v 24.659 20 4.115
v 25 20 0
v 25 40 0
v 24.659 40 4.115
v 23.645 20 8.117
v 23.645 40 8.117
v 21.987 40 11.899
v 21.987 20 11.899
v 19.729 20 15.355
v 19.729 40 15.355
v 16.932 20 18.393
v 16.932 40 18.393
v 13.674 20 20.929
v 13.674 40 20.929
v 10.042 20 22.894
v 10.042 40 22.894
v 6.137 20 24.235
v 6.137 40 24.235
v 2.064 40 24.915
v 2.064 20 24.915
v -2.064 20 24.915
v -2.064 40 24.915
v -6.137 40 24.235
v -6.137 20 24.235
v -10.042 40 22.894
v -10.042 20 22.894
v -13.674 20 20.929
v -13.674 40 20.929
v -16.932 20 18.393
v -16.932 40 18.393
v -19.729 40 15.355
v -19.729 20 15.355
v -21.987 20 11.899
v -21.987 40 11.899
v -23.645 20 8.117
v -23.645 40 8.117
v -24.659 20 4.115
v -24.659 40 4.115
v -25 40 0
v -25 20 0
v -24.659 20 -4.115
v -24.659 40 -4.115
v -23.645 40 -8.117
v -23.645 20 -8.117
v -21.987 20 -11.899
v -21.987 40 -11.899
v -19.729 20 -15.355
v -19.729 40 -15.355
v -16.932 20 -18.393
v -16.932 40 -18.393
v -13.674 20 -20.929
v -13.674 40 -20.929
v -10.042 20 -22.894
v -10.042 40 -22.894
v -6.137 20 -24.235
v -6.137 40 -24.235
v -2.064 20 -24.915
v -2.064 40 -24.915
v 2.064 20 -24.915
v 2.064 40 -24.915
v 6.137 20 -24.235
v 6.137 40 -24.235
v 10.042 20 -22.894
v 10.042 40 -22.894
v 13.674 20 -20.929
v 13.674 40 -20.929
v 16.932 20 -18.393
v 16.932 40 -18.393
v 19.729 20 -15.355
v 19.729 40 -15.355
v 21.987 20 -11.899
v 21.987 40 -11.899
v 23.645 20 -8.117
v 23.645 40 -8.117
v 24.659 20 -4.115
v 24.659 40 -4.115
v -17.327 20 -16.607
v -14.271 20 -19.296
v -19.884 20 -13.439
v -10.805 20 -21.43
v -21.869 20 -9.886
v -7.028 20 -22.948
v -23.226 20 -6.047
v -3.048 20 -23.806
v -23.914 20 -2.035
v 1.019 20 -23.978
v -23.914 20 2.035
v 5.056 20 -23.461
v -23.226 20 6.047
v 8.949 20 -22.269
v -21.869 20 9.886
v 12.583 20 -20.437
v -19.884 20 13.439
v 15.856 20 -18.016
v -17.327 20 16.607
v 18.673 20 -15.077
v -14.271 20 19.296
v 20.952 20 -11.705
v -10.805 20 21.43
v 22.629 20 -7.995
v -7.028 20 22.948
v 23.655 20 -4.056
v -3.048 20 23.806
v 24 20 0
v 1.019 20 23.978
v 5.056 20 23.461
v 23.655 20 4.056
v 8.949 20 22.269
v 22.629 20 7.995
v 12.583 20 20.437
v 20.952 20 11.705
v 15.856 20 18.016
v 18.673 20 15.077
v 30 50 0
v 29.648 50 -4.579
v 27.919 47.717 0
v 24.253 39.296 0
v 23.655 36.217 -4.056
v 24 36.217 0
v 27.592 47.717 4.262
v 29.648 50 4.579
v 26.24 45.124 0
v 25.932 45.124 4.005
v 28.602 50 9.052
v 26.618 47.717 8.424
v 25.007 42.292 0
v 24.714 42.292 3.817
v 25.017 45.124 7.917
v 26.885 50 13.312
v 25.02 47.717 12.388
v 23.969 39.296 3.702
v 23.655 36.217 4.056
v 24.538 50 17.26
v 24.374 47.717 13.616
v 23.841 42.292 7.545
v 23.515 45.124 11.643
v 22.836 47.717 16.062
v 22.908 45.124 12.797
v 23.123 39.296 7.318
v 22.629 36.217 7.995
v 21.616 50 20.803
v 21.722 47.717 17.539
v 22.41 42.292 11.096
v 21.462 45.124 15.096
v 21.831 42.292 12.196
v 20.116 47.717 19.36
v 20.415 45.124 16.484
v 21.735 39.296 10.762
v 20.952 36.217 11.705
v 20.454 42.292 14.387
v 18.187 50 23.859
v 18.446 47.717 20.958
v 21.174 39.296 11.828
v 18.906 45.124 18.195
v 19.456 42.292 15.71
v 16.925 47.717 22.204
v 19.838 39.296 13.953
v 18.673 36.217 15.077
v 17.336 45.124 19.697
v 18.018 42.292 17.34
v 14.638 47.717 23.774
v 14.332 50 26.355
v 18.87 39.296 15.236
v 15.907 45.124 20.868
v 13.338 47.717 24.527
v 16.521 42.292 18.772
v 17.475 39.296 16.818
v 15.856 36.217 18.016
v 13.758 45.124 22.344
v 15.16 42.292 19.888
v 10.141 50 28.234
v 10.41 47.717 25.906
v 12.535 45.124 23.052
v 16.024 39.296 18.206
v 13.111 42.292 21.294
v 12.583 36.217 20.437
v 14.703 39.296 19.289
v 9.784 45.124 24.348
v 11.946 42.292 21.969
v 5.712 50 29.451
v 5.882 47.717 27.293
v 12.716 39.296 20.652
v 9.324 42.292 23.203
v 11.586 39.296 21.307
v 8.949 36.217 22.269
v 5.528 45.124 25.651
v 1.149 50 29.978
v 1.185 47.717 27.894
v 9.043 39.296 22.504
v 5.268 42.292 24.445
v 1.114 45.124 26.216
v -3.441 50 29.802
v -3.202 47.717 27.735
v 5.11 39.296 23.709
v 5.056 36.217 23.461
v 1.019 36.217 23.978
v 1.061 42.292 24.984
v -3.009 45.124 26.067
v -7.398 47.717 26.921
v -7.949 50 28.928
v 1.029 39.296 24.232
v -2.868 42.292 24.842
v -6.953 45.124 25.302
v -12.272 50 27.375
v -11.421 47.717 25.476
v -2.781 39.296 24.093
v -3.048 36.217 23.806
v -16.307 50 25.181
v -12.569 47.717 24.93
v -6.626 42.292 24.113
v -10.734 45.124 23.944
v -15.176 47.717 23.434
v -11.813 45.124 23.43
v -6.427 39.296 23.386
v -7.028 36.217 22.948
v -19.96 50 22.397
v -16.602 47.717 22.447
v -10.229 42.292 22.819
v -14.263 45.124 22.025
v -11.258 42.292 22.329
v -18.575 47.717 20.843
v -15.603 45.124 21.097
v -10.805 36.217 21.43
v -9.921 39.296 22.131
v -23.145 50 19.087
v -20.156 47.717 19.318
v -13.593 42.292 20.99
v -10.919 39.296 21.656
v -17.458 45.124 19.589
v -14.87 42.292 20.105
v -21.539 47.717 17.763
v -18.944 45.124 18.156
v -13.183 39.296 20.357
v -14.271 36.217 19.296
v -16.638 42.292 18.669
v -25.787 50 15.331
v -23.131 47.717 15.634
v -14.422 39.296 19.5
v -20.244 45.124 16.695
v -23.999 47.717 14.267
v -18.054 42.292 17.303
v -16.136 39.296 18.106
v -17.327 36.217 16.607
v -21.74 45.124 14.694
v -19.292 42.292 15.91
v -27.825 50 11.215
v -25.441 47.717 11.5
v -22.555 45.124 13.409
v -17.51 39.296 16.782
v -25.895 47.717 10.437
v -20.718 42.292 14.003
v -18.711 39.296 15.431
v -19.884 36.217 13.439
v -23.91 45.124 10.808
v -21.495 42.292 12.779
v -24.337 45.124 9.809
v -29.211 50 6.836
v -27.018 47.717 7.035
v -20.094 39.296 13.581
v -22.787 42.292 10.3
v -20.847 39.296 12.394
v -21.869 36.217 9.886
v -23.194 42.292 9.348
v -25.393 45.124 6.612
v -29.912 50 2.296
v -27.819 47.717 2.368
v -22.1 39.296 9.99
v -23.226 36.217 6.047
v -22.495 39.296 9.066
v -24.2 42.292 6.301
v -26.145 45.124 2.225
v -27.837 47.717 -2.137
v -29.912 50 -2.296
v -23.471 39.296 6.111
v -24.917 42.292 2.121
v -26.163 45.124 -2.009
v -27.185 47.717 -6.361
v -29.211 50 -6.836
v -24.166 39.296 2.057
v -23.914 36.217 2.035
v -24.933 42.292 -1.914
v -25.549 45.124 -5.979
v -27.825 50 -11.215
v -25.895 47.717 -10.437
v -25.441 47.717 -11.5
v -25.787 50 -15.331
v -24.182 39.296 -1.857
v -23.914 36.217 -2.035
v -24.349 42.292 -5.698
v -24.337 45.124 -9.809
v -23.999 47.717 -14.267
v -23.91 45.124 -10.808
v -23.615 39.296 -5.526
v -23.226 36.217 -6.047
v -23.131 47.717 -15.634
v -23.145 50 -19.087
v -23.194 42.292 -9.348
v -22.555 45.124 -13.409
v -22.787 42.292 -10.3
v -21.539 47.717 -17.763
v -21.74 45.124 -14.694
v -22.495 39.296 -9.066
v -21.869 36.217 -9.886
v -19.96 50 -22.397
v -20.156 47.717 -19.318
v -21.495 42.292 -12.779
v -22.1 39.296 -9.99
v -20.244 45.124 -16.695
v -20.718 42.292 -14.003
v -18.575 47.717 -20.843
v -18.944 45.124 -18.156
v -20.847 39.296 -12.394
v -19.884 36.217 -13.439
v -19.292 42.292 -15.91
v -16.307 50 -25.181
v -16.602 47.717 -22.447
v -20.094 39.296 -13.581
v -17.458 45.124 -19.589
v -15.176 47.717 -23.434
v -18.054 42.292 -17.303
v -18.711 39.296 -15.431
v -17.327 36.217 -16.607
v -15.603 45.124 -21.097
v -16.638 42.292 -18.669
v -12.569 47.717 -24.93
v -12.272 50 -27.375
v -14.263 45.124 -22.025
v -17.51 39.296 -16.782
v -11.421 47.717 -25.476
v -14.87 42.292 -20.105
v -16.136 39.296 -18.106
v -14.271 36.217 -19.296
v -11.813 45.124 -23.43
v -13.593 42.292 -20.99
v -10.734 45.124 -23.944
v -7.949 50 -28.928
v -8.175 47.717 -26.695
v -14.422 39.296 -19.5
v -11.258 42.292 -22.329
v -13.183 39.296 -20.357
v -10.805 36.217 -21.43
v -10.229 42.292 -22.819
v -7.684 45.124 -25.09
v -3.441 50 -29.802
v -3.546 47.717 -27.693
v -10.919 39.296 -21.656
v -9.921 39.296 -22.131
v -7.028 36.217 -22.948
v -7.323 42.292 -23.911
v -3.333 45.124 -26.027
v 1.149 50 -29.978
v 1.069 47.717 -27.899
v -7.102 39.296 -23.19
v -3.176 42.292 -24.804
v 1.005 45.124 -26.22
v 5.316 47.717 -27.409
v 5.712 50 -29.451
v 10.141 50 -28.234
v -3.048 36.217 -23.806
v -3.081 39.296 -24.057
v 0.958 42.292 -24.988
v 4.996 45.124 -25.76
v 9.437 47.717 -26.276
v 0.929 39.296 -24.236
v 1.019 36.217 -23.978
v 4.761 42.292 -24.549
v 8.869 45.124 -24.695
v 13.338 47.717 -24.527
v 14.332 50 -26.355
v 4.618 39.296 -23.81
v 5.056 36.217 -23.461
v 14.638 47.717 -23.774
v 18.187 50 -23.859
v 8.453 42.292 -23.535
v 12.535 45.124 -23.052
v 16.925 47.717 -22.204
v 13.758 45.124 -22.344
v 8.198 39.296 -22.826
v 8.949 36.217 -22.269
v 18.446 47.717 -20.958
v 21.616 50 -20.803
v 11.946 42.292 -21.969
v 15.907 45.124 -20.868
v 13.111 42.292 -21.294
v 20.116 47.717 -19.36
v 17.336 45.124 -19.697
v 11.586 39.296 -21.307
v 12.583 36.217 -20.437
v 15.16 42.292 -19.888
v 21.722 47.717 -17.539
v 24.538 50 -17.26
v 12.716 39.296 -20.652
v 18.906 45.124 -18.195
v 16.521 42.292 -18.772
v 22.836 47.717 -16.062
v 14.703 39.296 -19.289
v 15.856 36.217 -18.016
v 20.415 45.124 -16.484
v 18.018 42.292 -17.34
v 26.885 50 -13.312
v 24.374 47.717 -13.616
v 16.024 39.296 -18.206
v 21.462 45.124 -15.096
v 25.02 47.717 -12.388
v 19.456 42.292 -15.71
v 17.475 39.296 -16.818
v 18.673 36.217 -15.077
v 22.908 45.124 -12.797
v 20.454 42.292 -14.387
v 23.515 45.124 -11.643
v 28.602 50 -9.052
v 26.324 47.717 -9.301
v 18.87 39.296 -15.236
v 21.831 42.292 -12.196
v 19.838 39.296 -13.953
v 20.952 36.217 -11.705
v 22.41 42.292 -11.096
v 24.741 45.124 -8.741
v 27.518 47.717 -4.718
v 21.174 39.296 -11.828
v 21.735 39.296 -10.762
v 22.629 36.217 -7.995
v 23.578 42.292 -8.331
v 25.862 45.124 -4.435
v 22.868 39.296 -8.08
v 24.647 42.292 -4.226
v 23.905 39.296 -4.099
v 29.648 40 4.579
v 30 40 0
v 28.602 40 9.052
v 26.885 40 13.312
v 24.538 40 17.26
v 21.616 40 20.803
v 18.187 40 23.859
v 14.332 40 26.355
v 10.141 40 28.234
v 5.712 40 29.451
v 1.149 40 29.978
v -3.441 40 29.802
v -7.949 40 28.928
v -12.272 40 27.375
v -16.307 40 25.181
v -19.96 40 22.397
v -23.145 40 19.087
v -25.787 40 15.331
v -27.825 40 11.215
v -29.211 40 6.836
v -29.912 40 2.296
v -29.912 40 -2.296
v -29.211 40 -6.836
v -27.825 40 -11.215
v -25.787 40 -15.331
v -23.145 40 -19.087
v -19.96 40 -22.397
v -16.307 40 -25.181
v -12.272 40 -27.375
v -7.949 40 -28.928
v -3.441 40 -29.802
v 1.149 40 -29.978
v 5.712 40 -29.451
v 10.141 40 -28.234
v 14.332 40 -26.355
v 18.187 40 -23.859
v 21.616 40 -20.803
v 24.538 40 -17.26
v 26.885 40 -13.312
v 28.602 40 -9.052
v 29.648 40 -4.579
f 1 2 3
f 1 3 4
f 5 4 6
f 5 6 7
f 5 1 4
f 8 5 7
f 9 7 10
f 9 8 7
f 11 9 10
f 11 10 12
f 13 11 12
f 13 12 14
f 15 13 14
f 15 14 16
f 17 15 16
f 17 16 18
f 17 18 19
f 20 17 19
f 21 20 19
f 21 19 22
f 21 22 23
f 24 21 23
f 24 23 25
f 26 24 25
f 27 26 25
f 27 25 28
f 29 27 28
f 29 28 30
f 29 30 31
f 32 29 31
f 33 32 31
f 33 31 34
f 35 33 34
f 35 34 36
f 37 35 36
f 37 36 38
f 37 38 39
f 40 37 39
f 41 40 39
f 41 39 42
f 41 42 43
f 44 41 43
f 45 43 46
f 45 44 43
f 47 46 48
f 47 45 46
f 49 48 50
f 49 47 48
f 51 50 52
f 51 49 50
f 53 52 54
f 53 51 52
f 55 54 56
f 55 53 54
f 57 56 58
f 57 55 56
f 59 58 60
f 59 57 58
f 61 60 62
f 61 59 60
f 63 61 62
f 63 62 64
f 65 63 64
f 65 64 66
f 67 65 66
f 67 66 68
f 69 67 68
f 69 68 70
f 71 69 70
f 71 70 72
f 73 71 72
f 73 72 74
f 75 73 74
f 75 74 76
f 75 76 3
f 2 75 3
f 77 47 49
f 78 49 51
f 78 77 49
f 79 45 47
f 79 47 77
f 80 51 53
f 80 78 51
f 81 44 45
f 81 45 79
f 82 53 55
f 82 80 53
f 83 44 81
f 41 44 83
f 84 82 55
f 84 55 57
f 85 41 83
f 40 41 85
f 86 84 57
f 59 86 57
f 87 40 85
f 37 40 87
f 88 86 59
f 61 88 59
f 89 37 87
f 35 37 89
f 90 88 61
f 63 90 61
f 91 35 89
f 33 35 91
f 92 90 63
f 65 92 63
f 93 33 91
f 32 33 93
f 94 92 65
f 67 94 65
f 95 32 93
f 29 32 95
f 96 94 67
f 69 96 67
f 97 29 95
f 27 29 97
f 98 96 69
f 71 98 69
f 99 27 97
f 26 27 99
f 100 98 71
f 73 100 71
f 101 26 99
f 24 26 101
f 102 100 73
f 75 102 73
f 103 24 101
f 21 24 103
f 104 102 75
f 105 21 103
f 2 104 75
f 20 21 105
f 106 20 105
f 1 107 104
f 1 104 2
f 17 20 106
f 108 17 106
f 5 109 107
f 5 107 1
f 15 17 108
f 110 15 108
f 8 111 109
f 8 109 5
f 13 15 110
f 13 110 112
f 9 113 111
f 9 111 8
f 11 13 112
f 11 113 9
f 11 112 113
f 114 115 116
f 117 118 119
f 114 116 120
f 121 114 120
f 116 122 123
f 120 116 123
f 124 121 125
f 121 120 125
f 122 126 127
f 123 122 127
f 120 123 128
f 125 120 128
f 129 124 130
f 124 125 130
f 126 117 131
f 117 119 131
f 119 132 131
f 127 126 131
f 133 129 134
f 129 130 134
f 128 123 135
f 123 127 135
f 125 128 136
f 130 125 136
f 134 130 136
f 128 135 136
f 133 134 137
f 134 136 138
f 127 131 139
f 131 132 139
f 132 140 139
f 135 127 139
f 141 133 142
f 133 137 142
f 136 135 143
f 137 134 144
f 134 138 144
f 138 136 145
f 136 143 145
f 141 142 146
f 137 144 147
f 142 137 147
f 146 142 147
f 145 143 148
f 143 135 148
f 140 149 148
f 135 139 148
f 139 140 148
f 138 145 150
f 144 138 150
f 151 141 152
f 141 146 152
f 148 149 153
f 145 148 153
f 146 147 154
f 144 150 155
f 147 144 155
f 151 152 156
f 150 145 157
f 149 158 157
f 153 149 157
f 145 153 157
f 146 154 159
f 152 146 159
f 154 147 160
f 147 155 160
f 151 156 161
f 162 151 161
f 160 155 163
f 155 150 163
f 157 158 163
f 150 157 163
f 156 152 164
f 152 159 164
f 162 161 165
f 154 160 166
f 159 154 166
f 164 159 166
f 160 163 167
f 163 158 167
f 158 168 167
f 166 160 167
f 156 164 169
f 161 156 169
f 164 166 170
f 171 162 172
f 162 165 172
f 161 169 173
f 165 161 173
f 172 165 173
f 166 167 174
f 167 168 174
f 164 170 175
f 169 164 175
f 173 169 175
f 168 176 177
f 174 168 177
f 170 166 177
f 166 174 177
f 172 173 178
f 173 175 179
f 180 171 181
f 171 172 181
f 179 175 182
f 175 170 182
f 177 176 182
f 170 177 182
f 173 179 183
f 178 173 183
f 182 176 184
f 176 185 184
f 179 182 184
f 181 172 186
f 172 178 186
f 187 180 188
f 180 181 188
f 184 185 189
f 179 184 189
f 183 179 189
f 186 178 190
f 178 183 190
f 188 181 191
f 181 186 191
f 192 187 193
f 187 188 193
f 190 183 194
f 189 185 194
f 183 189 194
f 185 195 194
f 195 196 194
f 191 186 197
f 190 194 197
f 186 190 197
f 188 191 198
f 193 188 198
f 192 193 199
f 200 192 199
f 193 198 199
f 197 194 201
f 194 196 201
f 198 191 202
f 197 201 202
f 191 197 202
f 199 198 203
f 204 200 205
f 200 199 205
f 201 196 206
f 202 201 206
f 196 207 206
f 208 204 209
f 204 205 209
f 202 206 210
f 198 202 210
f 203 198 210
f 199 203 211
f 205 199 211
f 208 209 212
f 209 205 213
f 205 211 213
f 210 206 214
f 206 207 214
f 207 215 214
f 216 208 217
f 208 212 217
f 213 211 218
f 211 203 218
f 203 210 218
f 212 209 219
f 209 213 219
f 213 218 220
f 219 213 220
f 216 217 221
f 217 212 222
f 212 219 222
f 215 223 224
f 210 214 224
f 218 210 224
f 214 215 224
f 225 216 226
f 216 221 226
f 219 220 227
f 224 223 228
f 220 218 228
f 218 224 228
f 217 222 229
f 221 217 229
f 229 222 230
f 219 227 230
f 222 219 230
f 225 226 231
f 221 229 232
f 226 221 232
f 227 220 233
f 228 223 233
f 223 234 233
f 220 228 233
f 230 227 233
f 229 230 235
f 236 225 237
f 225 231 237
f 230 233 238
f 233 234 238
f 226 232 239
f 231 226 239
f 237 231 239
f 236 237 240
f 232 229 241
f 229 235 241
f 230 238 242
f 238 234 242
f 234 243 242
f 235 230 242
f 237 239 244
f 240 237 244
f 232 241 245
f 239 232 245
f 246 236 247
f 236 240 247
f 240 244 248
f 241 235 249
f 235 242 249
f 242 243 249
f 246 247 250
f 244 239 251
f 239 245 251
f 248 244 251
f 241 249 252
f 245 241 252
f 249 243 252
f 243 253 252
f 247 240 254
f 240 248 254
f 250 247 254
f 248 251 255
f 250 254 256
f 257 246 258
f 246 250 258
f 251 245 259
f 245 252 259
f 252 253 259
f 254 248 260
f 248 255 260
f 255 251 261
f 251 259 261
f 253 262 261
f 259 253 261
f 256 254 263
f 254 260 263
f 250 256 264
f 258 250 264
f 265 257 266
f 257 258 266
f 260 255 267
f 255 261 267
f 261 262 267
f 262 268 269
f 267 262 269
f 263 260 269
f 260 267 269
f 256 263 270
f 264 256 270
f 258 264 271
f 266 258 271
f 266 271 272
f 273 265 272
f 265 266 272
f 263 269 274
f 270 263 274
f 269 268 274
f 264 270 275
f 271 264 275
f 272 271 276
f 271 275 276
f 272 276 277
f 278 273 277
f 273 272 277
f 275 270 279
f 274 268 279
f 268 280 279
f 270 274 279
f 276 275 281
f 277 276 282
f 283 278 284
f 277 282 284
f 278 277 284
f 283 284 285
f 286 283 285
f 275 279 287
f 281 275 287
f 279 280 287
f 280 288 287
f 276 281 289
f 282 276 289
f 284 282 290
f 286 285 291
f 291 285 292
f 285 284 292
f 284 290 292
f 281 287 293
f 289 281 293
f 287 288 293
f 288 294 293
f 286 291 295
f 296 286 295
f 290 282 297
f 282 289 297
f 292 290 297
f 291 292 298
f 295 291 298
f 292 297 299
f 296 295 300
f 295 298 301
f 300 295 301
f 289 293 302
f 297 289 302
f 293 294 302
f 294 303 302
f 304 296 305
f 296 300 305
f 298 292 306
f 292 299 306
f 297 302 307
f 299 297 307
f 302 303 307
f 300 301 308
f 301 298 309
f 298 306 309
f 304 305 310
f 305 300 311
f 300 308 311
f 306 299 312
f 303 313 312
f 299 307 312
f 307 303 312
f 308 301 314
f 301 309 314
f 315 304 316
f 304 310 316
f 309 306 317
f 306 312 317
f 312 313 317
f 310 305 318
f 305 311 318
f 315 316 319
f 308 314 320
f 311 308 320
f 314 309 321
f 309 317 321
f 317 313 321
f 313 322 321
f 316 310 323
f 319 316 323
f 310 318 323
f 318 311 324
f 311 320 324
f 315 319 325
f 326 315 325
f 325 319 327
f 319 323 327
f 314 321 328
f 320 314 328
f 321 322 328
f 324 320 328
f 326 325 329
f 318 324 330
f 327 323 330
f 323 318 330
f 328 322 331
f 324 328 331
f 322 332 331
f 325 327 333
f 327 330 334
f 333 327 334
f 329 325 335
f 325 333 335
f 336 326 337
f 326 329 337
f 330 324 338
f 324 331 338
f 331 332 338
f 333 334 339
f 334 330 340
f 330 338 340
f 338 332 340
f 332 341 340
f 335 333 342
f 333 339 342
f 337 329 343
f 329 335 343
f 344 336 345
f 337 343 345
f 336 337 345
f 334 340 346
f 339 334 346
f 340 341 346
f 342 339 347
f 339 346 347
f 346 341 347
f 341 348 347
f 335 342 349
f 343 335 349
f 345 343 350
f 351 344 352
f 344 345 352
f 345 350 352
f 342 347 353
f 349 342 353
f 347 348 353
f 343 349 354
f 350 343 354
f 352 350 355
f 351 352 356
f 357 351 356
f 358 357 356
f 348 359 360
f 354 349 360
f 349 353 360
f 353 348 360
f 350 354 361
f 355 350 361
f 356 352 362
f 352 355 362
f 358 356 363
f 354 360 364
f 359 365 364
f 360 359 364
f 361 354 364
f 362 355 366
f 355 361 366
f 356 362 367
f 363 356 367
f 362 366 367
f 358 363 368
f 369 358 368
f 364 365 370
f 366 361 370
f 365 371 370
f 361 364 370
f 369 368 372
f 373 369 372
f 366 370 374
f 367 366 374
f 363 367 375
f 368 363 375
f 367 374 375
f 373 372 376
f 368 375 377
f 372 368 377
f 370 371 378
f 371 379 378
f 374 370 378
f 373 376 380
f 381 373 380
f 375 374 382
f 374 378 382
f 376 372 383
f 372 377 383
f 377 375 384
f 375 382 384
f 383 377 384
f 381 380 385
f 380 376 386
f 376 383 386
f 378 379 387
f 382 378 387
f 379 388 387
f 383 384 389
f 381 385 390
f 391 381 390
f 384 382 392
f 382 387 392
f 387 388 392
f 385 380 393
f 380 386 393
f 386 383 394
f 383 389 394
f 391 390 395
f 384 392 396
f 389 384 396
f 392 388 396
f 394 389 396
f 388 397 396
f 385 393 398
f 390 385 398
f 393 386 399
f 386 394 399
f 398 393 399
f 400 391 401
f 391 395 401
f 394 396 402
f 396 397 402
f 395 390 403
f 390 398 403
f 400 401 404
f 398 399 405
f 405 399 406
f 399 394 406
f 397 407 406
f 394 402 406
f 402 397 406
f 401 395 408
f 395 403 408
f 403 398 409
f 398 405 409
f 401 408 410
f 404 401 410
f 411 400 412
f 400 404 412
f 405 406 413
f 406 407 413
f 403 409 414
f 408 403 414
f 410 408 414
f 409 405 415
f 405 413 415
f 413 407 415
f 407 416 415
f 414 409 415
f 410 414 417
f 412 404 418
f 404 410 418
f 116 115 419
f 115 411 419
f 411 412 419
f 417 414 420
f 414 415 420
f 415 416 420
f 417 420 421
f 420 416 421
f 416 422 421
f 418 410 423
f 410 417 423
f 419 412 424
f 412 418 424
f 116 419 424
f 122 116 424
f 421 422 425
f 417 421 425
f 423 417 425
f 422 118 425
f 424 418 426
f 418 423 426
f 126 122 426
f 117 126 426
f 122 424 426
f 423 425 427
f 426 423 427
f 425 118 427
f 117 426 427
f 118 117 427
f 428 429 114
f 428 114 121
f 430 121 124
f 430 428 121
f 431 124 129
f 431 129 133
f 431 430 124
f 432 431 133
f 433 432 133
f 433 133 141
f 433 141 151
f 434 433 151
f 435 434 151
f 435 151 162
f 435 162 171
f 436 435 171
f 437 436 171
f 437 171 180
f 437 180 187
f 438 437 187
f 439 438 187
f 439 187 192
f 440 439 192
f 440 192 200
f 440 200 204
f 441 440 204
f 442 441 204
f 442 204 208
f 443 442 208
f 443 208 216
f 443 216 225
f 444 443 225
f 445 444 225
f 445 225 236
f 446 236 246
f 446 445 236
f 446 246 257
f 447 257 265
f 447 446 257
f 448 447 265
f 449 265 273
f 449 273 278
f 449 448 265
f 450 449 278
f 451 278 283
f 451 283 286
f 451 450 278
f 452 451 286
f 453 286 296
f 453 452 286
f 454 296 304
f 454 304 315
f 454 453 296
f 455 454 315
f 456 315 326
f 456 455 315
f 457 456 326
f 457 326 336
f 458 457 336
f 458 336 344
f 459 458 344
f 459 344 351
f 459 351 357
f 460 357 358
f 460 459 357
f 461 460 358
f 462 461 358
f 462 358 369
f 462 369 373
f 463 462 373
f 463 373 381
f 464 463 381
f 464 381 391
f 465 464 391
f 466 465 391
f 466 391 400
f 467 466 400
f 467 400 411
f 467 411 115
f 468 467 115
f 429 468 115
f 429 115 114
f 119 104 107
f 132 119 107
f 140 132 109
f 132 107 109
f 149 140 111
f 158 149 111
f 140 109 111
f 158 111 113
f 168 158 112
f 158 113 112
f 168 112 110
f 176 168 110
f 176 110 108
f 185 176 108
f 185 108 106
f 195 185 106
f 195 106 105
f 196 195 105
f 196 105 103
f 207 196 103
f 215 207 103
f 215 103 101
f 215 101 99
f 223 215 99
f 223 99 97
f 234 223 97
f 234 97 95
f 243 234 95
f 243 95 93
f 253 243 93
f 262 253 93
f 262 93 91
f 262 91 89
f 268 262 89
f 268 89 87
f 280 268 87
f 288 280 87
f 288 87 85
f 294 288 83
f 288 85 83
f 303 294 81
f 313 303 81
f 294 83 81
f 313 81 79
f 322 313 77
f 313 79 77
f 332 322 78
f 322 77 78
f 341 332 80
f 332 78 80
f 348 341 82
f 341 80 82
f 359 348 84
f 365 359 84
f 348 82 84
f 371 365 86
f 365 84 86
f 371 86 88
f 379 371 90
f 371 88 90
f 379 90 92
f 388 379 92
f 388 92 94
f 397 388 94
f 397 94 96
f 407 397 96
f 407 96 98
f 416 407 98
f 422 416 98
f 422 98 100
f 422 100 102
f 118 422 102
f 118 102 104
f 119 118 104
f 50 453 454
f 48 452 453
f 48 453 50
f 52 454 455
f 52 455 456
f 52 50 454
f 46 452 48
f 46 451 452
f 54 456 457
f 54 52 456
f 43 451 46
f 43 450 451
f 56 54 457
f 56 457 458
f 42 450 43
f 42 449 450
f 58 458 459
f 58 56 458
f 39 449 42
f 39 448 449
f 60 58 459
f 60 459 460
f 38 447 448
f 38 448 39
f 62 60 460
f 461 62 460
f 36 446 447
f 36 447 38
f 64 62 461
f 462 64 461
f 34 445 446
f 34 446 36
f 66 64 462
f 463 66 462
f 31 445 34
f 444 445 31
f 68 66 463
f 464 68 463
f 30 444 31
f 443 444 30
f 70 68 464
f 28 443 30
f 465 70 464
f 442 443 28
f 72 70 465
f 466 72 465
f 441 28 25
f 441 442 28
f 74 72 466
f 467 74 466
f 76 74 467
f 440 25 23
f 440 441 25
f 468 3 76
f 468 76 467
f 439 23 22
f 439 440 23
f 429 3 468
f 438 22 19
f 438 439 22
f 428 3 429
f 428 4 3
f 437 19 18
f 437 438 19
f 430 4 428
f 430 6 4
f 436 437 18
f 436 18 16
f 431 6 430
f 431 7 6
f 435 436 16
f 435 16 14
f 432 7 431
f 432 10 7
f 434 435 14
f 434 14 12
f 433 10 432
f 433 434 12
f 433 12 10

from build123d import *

# Parameters (mm, degrees)
F0_R     = 30
F1_DEPTH = 50
F2_R     = 30
F2_R_2   = 25
F3_DEPTH = 40
F4_R     = 24
F5_DEPTH = 60
F7_DEPTH = 20


# Not quite as in the source:
# - a fillet or chamfer that OpenCascade refuses, or shapes differently, is made with other operations: its cross-section is extruded or revolved along the edge and cut away or added


with BuildPart() as f1:
    # F0 (on Front) → F1 (new body)
    with BuildSketch(Plane.XZ):
        Circle(F0_R)
    extrude(amount=-F1_DEPTH)

    # F2 (on face) → F3 (cut)
    with BuildSketch(Plane.XZ):
        Circle(F2_R)
        Circle(F2_R_2, mode=Mode.SUBTRACT)
    extrude(amount=-F3_DEPTH, mode=Mode.SUBTRACT)

    # F4 (on face) → F5 (cut)
    with BuildSketch(Plane.XZ):
        Circle(F4_R)
    extrude(amount=-F5_DEPTH, mode=Mode.SUBTRACT)

    # F6: fillet of radius 18.8308657865 on 1 edges, made by hand

    # F6_s1 → F6_t2 (revolve, cut)
    with BuildSketch(Plane.XY):
        with BuildLine():
            ThreePointArc((30, 50), (25.5650351112, 43.7331811345), (24, 36.2170253777))
            Line((24, 36.2170253777), (23.6233826843, 36.2170253777))
            Line((23.6233826843, 36.2170253777), (23.6233826843, 50))
            Line((23.6233826843, 50), (24, 50.3766173157))
            ThreePointArc((24, 50.3766173157), (27, 50.3766173157), (29.7433826843, 50.2756594924))
            Line((29.7433826843, 50.2756594924), (30, 50))
        make_face()
    revolve(axis=Axis((0, 50, 0), (0, -1, 0)), mode=Mode.SUBTRACT)

    # F7 (cut): a face of the model
    f7_faces = [f1.faces().sort_by_distance(p)[0] for p in [
        (-24.2928932188, 0, 0),
    ]]
    extrude(f7_faces, amount=-F7_DEPTH, mode=Mode.SUBTRACT)


solid = f1.part
